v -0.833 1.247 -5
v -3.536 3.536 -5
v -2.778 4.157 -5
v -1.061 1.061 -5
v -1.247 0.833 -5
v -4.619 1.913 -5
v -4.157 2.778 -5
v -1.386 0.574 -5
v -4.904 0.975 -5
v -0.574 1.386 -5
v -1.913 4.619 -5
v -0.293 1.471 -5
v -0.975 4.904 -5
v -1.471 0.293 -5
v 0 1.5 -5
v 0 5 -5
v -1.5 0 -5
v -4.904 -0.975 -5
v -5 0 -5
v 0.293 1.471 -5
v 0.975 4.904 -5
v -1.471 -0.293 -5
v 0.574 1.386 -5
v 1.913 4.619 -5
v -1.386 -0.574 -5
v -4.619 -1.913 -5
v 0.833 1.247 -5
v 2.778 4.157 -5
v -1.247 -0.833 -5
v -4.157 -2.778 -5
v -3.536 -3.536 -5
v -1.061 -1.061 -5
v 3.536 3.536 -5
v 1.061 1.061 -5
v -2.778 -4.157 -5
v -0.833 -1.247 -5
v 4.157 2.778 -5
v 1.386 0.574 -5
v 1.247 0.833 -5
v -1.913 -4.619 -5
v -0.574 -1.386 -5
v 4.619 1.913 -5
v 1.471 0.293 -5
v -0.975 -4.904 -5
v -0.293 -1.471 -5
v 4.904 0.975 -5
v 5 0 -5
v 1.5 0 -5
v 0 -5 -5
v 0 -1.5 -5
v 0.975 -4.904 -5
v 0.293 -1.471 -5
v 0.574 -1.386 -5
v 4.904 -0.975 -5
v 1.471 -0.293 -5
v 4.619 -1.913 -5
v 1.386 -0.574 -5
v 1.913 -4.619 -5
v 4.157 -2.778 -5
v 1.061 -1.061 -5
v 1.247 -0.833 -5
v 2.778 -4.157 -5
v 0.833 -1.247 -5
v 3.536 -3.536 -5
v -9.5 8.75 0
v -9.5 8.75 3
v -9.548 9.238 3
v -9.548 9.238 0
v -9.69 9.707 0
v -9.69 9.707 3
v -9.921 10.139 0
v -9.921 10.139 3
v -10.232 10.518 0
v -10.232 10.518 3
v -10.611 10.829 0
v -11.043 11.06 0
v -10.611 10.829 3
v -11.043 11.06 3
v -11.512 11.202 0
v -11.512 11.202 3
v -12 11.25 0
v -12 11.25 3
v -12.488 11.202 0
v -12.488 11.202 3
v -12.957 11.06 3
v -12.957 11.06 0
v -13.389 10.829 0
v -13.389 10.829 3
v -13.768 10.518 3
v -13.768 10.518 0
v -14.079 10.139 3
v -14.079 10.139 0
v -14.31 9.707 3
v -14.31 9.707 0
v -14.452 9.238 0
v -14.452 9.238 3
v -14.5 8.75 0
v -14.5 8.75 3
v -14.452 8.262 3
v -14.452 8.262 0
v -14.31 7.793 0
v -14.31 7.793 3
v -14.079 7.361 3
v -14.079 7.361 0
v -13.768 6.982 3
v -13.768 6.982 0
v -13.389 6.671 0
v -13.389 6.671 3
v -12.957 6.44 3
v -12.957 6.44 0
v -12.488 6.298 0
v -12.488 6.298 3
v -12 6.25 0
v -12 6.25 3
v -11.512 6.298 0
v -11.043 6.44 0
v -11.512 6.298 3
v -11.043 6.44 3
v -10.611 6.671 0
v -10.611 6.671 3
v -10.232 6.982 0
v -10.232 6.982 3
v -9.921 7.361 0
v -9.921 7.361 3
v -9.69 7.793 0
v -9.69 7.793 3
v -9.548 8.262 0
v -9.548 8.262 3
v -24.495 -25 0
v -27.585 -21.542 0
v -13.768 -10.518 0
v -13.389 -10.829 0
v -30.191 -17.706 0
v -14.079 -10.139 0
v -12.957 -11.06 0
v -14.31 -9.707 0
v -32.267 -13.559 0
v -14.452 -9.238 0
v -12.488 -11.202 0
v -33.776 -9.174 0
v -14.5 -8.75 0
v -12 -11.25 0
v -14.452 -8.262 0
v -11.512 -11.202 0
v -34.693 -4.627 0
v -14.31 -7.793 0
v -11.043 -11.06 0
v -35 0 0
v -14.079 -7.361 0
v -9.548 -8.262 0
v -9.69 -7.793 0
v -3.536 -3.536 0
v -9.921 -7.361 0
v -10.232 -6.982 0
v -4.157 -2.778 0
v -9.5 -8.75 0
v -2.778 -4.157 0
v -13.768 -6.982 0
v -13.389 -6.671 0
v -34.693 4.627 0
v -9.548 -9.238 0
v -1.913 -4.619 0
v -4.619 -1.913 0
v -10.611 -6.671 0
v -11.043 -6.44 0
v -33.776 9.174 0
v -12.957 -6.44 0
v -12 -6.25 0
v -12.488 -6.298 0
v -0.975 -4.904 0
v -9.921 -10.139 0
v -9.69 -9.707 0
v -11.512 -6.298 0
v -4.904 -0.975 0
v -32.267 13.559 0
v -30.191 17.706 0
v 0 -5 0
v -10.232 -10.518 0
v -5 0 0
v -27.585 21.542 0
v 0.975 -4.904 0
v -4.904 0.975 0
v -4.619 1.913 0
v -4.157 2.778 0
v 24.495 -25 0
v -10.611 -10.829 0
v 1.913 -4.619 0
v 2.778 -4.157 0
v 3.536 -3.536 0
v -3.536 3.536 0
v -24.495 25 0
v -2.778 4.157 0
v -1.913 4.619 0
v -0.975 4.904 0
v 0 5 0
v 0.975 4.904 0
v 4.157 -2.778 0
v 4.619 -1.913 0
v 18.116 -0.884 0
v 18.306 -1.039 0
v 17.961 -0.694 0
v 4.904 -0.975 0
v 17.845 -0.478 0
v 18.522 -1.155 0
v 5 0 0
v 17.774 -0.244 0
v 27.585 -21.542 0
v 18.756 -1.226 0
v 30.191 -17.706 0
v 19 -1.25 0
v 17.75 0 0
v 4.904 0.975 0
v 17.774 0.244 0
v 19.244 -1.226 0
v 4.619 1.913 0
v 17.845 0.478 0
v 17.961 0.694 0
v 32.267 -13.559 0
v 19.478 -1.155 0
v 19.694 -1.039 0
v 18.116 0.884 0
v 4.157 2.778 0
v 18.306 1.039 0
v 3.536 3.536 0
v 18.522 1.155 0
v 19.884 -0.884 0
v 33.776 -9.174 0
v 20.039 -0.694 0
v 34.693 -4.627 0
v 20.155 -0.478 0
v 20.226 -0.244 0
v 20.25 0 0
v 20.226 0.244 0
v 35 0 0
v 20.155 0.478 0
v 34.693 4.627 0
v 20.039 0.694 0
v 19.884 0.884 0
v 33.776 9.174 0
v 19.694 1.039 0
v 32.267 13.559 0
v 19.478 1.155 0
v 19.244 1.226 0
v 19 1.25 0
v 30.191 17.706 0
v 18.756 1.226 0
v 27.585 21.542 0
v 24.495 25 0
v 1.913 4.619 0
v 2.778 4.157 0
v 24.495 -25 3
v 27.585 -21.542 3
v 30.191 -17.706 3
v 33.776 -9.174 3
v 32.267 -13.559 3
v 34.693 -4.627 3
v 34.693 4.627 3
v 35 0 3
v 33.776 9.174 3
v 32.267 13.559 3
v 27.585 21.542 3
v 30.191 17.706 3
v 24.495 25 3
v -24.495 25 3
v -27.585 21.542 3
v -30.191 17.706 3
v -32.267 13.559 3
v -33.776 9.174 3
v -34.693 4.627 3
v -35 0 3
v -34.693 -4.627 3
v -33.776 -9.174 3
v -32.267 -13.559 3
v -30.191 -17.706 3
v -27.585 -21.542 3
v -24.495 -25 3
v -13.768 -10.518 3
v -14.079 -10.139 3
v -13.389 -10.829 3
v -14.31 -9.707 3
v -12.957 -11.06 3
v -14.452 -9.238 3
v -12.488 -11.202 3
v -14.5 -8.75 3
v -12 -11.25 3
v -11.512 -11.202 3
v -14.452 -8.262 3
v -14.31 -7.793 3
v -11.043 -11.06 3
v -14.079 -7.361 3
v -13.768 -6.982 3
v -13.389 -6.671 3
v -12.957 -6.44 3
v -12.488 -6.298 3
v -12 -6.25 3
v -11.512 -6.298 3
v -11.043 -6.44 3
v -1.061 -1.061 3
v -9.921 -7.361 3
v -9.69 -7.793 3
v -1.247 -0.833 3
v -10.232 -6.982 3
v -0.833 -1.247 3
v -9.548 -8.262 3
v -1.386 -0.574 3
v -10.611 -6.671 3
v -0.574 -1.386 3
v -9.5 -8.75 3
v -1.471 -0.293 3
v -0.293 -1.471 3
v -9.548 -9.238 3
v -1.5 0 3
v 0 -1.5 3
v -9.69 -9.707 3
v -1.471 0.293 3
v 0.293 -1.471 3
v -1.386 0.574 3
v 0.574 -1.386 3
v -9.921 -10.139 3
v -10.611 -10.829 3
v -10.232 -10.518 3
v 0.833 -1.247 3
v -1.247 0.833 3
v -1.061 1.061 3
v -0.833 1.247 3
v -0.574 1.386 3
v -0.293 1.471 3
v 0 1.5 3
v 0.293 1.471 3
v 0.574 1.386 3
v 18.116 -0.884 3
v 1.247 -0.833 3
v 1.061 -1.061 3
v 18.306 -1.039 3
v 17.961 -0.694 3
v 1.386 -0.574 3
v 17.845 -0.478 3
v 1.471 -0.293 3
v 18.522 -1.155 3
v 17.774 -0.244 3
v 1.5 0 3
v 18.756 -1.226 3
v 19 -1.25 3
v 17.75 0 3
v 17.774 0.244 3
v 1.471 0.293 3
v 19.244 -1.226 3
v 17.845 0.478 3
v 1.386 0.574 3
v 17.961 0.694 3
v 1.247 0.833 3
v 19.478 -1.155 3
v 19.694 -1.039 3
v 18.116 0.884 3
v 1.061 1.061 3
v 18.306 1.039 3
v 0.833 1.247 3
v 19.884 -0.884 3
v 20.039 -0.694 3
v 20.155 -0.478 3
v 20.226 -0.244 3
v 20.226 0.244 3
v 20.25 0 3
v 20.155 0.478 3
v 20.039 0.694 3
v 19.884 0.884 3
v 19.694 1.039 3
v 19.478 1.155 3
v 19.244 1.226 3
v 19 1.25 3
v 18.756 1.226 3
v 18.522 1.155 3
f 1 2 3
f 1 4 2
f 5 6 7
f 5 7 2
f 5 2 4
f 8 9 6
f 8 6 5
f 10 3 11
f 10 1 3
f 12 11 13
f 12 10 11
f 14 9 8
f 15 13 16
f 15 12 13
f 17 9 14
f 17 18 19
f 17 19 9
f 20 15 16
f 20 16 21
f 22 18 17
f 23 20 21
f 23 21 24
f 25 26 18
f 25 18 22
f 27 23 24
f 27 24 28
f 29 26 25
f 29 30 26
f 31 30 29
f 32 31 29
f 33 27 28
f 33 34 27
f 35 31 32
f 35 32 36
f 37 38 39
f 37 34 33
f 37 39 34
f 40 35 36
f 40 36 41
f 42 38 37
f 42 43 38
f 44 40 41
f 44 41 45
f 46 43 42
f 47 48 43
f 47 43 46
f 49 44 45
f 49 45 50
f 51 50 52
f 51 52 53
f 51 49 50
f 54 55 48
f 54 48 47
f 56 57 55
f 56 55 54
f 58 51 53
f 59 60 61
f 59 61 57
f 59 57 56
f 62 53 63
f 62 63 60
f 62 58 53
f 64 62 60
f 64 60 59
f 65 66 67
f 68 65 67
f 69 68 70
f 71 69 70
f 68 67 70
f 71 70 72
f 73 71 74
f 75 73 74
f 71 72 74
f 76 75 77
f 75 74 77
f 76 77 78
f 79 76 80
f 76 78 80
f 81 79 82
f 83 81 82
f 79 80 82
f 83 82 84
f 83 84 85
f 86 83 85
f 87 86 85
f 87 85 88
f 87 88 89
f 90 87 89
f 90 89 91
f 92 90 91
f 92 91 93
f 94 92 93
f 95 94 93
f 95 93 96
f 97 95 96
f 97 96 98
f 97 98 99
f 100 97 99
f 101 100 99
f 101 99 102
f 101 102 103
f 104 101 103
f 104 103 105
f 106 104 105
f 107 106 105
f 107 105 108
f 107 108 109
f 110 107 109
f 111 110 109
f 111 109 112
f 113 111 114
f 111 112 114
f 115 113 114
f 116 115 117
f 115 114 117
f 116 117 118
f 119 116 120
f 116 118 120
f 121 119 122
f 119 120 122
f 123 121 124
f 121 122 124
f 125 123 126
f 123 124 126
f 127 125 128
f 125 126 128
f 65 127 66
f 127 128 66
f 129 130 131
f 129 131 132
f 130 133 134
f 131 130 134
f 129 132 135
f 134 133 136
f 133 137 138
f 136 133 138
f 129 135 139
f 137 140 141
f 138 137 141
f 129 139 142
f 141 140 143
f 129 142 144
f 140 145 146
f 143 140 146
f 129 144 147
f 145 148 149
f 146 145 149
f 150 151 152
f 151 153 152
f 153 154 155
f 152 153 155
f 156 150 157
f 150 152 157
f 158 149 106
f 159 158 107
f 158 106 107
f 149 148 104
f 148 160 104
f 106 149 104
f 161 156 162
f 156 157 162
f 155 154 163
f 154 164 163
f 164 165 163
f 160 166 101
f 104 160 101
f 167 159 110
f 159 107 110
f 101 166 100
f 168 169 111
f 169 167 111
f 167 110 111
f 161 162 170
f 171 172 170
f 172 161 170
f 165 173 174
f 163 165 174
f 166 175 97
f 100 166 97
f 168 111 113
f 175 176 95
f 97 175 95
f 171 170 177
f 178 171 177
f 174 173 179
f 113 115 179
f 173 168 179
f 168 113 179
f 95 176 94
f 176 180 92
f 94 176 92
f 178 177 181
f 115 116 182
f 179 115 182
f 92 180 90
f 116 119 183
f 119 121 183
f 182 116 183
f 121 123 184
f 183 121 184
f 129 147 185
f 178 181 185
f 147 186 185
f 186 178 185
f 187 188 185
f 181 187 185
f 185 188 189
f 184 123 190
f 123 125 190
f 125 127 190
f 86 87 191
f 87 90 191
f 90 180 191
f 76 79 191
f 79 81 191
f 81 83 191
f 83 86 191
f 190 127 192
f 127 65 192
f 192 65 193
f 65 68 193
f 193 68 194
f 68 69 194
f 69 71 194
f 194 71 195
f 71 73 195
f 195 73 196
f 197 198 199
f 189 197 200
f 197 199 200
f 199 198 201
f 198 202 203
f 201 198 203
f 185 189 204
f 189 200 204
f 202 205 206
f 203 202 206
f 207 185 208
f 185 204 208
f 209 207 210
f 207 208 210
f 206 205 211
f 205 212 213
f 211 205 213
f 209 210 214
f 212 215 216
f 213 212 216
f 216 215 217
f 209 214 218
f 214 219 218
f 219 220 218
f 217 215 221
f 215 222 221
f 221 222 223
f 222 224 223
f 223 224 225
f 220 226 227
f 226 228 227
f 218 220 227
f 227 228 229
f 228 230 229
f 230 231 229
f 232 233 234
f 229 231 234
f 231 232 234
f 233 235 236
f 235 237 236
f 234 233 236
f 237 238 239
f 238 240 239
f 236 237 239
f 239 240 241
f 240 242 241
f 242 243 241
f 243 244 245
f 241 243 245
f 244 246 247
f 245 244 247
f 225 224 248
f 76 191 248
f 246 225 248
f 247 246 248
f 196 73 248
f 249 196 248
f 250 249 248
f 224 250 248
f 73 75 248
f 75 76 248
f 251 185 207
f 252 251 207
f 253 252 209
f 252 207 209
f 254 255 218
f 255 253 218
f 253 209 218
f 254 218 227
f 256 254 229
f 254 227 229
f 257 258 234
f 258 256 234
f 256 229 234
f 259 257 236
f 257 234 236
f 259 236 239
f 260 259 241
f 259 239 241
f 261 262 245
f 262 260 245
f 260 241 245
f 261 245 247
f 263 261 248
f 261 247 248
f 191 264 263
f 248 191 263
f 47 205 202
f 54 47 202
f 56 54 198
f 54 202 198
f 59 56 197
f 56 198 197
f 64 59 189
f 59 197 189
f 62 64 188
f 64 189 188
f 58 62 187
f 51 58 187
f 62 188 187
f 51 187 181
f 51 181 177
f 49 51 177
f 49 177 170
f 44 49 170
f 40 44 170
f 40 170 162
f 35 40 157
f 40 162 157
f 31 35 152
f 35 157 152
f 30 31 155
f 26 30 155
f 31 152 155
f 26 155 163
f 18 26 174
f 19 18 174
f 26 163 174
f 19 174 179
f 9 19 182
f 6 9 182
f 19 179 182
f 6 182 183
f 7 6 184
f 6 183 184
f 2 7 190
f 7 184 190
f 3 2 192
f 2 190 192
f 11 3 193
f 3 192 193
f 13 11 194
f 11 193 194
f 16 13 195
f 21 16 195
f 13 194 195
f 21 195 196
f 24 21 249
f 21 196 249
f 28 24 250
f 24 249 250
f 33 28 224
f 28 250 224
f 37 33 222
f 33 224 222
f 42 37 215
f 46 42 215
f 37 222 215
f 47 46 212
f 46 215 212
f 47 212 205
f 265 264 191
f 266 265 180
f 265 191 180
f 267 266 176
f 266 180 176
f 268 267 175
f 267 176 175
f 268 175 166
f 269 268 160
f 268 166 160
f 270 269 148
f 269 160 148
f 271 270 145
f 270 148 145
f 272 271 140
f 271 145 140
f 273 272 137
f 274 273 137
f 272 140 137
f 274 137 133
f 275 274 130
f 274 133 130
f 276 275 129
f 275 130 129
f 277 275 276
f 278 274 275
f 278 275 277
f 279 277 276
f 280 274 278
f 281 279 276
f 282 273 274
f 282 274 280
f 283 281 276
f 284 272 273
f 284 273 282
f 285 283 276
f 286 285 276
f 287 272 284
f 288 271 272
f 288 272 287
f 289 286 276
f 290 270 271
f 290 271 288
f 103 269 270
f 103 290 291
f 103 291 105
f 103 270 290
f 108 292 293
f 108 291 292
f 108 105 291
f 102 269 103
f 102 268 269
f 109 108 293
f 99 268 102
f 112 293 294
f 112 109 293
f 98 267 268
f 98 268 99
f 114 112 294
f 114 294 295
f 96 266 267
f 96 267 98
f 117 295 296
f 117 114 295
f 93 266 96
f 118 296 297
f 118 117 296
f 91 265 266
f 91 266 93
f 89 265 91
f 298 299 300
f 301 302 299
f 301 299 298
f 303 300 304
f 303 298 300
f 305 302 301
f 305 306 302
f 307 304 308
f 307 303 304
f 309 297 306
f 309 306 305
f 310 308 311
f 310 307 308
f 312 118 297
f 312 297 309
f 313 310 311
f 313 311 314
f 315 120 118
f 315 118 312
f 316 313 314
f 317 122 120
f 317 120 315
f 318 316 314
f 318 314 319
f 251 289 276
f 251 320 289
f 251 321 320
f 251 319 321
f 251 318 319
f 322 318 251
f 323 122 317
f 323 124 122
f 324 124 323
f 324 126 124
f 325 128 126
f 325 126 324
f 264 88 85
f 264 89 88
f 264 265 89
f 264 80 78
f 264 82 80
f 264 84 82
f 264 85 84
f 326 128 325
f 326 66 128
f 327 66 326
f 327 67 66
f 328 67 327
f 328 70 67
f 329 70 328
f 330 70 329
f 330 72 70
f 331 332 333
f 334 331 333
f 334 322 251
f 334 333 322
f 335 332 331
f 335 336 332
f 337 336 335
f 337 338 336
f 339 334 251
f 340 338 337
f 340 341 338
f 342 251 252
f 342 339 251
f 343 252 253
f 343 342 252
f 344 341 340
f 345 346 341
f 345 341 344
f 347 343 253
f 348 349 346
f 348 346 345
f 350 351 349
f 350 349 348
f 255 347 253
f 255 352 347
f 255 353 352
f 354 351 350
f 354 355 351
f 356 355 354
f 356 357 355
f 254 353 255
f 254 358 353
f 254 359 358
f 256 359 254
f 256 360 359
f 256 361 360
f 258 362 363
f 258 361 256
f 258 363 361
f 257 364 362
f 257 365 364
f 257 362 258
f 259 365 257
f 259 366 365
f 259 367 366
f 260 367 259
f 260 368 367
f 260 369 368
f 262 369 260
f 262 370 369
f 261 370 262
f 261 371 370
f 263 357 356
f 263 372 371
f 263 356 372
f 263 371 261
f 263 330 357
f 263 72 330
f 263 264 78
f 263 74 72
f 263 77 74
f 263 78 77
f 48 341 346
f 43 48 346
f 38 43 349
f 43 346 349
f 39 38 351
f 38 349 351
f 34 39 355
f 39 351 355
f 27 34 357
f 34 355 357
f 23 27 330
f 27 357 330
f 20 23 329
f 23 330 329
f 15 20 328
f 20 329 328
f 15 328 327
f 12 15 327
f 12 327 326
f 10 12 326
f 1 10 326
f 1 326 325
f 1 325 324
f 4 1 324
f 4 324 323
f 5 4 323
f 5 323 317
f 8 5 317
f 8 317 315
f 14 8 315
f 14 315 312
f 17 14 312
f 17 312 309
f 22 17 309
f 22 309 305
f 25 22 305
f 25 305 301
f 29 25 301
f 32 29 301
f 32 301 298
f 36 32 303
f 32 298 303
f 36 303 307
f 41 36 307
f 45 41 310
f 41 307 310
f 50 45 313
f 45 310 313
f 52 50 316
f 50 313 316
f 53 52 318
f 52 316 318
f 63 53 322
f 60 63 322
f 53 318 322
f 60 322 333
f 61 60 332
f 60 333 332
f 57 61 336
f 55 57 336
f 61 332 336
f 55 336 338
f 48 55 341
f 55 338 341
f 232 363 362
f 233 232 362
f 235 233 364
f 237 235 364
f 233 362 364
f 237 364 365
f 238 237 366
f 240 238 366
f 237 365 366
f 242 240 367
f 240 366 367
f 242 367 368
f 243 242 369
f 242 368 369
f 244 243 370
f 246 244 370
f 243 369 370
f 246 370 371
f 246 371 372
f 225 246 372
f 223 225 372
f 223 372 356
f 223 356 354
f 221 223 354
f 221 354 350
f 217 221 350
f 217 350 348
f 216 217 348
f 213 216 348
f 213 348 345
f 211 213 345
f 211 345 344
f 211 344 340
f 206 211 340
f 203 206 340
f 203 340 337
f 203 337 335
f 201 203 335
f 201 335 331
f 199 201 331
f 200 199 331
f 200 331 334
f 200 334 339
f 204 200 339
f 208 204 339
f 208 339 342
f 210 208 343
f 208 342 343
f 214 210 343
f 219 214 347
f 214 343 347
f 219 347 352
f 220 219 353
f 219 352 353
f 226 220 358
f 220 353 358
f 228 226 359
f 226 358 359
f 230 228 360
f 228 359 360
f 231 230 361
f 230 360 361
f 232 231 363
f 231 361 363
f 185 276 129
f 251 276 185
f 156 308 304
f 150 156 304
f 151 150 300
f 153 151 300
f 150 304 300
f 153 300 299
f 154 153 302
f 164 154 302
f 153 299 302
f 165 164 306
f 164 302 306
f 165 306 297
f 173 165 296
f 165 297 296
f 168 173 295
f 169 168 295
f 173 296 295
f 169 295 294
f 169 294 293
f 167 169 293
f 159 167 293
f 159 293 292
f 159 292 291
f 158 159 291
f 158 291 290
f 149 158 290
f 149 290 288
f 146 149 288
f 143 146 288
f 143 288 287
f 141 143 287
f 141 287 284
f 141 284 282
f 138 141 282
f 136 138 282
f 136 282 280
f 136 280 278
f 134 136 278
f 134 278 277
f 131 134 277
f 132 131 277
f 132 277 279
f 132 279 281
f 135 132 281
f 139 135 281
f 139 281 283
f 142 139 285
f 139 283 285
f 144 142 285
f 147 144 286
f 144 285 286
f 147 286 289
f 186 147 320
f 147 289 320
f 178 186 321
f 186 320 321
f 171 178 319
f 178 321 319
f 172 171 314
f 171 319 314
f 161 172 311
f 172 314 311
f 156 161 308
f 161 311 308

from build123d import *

# Parameters (mm, degrees)
F0_R     = 35
F1_DEPTH = 3
F2_R     = 5
F3_DEPTH = 5
F4_R     = 1.5
F4_R_2   = 2.5
F4_R_3   = 1.25
F5_DEPTH = 8.001
F6_W     = 70
F6_H     = 50
F7_DEPTH = 10


# Not quite as in the source:
# - a feature names something its author has since deleted; it is built from what else it names


with BuildPart() as f1:
    # F0 (on Top) → F1 (new body)
    with BuildSketch(Plane.XY):
        Circle(F0_R)
    extrude(amount=F1_DEPTH)

    # F2 (on face) → F3 (join)
    with BuildSketch(Plane(origin=(0, 0, 0), x_dir=(1, 0, 0), z_dir=(0, 0, -1))):
        Circle(F2_R)
    extrude(amount=F3_DEPTH)

    # F4 (on face) → F5 (cut, through all)
    with BuildSketch(Plane.XY.offset(3)):
        Circle(F4_R)
        with Locations((-12, 8.75)):
            Circle(F4_R_2)
        with Locations((-12, -8.75)):
            Circle(F4_R_2)
        with Locations((19, 0)):
            Circle(F4_R_3)
    extrude(amount=-F5_DEPTH, mode=Mode.SUBTRACT)

    # F6 (on Top) → F7 (intersect, symmetric)
    with BuildSketch(Plane.XY):
        Rectangle(F6_W, F6_H)
    extrude(amount=F7_DEPTH, both=True, mode=Mode.INTERSECT)


solid = f1.part
